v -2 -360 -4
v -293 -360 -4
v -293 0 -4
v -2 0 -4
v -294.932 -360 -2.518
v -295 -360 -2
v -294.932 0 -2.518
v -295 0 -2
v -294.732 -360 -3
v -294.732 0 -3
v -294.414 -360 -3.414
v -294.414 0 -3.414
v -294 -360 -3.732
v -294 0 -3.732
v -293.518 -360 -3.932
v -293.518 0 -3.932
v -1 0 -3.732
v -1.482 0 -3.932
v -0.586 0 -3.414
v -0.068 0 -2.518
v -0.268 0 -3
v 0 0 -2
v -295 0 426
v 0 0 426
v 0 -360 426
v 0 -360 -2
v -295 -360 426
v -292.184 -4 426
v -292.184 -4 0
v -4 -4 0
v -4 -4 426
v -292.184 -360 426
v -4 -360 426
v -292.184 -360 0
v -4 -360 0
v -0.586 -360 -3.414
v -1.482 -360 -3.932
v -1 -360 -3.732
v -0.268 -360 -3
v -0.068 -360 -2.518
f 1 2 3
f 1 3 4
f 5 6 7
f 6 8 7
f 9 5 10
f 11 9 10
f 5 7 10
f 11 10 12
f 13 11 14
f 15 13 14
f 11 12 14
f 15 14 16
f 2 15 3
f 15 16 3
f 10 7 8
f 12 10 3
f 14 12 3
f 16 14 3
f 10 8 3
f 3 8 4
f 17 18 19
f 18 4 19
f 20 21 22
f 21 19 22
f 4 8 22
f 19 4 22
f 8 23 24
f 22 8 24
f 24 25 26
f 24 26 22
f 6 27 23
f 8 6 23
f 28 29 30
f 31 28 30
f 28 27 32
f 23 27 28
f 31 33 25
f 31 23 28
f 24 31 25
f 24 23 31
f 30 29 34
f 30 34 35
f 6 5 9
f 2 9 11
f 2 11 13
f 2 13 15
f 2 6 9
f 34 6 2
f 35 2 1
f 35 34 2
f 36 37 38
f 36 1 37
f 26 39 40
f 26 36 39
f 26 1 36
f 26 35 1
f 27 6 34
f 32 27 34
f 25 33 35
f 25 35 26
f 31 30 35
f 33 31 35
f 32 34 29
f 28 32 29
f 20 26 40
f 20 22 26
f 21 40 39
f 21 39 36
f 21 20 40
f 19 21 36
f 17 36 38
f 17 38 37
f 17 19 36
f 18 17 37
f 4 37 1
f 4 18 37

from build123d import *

# Parameters (mm, degrees)
F1_DEPTH = 426
F2_W     = 295
F2_H     = 360
F3_DEPTH = 4
F4_R     = 2


# Not quite as in the source:
# - a feature names something its author has since deleted; it is built from what else it names


with BuildPart() as f1:
    # F0 (on Top) → F1 (new body)
    with BuildSketch(Plane.XY):
        Polygon((-4, -360), (0, -360), (0, 0), (-295, 0), (-295, -360), (-292.1838745495, -360), (-292.1838745495, -4), (-4, -4), align=None)
    extrude(amount=F1_DEPTH)

    # F2 (on Top) → F3 (join)
    with BuildSketch(Plane.XY):
        with Locations((-147.5, -180)):
            Rectangle(F2_W, F2_H)
    extrude(amount=-F3_DEPTH)

    # F4
    f4_edges = [f1.edges().sort_by_distance(p)[0] for p in [
        (-295, -180, -4),
        (0, -180, -4),
    ]]
    fillet(f4_edges, radius=F4_R)


solid = f1.part
